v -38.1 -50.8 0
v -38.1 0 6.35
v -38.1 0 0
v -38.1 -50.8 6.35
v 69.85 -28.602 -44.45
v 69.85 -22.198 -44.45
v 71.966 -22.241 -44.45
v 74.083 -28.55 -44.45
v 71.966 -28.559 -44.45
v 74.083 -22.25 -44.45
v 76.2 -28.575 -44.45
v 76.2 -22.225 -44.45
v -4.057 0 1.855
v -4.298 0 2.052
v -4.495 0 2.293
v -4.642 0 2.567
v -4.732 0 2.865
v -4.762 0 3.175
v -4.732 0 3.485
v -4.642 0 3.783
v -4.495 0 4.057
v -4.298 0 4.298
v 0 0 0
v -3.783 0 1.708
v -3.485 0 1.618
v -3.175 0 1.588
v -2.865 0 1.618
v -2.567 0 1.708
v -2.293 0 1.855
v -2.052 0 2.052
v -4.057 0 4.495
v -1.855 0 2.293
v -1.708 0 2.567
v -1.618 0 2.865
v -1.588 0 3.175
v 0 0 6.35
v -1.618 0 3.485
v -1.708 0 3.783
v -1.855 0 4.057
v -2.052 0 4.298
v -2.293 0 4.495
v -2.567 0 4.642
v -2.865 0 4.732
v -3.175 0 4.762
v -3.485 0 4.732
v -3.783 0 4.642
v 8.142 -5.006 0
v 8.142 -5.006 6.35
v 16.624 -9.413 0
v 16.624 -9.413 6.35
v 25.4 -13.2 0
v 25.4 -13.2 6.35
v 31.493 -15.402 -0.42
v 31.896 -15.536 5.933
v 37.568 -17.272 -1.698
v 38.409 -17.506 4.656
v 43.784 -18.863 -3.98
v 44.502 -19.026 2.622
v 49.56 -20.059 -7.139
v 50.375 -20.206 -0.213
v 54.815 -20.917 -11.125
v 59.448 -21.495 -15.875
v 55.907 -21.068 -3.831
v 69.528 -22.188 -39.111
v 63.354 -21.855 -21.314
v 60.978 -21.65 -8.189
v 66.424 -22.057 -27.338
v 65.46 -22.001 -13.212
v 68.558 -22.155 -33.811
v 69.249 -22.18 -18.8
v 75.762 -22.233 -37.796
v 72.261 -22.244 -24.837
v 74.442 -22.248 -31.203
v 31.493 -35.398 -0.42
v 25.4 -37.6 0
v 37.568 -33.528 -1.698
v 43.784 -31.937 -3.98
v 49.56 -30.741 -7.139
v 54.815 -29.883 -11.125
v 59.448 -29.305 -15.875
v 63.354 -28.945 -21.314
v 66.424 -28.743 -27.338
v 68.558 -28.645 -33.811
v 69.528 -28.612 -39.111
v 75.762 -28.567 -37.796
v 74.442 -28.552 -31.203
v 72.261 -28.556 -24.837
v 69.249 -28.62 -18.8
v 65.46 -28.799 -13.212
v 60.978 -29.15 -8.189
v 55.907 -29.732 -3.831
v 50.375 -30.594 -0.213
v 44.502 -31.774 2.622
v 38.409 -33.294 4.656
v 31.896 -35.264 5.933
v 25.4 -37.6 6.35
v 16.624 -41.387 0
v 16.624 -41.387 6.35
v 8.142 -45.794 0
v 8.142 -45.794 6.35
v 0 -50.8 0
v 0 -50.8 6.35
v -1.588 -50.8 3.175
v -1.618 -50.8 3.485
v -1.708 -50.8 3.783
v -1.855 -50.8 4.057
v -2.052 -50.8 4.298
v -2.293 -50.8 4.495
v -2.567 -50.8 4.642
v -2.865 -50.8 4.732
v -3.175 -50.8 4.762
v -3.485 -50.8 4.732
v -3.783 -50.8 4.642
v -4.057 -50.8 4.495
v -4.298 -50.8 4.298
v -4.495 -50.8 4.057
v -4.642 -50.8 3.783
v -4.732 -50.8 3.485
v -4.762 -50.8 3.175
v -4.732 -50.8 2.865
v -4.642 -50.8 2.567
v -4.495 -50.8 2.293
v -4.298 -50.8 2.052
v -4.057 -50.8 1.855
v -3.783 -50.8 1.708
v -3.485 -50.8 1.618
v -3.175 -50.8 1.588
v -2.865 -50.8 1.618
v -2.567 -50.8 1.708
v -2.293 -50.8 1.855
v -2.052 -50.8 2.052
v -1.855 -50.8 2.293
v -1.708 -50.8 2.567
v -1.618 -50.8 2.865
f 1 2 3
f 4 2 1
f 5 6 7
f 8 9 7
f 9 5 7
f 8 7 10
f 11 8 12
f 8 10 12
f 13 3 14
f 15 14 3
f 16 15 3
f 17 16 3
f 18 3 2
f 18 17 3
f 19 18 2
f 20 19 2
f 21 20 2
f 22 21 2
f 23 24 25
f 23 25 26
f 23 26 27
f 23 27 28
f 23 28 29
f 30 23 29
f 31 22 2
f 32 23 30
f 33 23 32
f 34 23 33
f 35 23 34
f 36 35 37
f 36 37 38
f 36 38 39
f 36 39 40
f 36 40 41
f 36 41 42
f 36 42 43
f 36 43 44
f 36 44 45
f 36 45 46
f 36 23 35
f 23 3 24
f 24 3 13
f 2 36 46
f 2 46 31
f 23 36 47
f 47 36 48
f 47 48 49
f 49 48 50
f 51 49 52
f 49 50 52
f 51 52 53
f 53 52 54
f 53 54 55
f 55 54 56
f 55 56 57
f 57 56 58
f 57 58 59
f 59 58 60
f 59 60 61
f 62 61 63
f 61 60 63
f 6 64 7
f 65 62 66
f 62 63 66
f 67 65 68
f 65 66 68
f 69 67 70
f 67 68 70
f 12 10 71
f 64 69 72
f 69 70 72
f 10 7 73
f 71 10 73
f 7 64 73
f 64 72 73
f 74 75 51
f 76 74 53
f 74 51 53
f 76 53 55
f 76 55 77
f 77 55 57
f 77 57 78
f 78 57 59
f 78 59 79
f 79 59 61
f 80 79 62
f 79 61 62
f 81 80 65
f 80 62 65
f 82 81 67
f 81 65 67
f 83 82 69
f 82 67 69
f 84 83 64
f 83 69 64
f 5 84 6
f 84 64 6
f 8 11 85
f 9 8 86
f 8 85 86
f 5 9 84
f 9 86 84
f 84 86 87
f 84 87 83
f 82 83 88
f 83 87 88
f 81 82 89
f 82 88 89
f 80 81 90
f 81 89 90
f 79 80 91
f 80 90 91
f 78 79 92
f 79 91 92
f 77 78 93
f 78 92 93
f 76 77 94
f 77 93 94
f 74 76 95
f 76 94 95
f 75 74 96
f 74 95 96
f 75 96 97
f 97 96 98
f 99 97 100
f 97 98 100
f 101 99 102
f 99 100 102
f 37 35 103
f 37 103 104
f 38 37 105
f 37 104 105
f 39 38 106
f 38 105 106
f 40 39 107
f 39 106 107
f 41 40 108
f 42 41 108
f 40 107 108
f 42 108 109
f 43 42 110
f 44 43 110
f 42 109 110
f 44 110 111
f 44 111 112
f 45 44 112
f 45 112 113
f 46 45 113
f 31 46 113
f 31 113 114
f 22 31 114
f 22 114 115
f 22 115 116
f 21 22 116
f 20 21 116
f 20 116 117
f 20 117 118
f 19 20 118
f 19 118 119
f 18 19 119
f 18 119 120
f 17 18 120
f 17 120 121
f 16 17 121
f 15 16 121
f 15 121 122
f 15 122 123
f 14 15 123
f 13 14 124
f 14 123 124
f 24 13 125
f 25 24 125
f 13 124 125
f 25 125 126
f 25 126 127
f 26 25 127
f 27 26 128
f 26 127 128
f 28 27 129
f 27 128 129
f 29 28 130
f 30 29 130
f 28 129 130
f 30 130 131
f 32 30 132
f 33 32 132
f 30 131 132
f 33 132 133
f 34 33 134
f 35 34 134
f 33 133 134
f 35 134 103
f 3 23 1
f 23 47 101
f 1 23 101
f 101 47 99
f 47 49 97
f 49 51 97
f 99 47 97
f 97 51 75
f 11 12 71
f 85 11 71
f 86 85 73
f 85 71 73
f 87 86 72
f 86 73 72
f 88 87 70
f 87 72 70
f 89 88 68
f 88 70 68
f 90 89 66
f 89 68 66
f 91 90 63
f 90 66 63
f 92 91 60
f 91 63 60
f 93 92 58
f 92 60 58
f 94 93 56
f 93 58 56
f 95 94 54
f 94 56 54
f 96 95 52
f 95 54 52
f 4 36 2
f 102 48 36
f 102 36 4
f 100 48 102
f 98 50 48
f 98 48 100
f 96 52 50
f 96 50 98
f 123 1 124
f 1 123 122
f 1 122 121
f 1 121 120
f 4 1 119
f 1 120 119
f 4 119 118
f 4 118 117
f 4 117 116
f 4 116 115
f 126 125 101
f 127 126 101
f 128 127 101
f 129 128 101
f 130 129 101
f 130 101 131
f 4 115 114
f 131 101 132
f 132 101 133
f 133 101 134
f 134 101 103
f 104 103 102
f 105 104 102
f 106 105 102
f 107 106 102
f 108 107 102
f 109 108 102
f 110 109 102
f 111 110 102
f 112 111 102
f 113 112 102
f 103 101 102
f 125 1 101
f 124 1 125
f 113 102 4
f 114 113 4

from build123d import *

# Parameters (mm, degrees)
F1_DEPTH = 50.8
F3_DEPTH = 50.801
F4_W     = 50.8
F4_H     = 6.35
F5_DEPTH = 38.1
F6_R     = 1.5875
F7_DEPTH = 50.801


with BuildPart() as f1:
    # F0 (on Front) → F1 (new body)
    with BuildSketch(Plane.XZ):
        with BuildLine():
            Line((0, 6.35), (0, 0))
            Line((0, 0), (25.4, 0))
            ThreePointArc((25.4, 0), (56.830896, -13.019104), (69.85, -44.45))
            Line((69.85, -44.45), (76.2, -44.45))
            ThreePointArc((76.2, -44.45), (61.321024, -8.528976), (25.4, 6.35))
            Line((25.4, 6.35), (0, 6.35))
        make_face()
    extrude(amount=F1_DEPTH)

    # F2 (on face) → F3 (cut, through all)
    with BuildSketch(Plane.XY.offset(6.35)):
        with BuildLine():
            ThreePointArc((76.2, -28.575), (36.401015, -33.862407), (0, -50.8))
            Line((0, -50.8), (76.2, -50.8))
            Line((76.2, -50.8), (76.2, -28.575))
        make_face()
        with BuildLine():
            Line((76.2, 0), (0, 0))
            ThreePointArc((0, 0), (36.401015, -16.937593), (76.2, -22.225))
            Line((76.2, -22.225), (76.2, 0))
        make_face()
    extrude(amount=-F3_DEPTH, mode=Mode.SUBTRACT)

    # F4 (on face) → F5 (join)
    with BuildSketch(Plane(origin=(0, 0, 0), x_dir=(0, -1, 0), z_dir=(-1, 0, 0))):
        with Locations((25.4, 3.175)):
            Rectangle(F4_W, F4_H)
    extrude(amount=F5_DEPTH)

    # F6 (on face) → F7 (cut, through all)
    with BuildSketch(Plane.XZ.offset(50.8)):
        with Locations((-3.175, 3.175)):
            Circle(F6_R)
    extrude(amount=-F7_DEPTH, mode=Mode.SUBTRACT)


solid = f1.part
